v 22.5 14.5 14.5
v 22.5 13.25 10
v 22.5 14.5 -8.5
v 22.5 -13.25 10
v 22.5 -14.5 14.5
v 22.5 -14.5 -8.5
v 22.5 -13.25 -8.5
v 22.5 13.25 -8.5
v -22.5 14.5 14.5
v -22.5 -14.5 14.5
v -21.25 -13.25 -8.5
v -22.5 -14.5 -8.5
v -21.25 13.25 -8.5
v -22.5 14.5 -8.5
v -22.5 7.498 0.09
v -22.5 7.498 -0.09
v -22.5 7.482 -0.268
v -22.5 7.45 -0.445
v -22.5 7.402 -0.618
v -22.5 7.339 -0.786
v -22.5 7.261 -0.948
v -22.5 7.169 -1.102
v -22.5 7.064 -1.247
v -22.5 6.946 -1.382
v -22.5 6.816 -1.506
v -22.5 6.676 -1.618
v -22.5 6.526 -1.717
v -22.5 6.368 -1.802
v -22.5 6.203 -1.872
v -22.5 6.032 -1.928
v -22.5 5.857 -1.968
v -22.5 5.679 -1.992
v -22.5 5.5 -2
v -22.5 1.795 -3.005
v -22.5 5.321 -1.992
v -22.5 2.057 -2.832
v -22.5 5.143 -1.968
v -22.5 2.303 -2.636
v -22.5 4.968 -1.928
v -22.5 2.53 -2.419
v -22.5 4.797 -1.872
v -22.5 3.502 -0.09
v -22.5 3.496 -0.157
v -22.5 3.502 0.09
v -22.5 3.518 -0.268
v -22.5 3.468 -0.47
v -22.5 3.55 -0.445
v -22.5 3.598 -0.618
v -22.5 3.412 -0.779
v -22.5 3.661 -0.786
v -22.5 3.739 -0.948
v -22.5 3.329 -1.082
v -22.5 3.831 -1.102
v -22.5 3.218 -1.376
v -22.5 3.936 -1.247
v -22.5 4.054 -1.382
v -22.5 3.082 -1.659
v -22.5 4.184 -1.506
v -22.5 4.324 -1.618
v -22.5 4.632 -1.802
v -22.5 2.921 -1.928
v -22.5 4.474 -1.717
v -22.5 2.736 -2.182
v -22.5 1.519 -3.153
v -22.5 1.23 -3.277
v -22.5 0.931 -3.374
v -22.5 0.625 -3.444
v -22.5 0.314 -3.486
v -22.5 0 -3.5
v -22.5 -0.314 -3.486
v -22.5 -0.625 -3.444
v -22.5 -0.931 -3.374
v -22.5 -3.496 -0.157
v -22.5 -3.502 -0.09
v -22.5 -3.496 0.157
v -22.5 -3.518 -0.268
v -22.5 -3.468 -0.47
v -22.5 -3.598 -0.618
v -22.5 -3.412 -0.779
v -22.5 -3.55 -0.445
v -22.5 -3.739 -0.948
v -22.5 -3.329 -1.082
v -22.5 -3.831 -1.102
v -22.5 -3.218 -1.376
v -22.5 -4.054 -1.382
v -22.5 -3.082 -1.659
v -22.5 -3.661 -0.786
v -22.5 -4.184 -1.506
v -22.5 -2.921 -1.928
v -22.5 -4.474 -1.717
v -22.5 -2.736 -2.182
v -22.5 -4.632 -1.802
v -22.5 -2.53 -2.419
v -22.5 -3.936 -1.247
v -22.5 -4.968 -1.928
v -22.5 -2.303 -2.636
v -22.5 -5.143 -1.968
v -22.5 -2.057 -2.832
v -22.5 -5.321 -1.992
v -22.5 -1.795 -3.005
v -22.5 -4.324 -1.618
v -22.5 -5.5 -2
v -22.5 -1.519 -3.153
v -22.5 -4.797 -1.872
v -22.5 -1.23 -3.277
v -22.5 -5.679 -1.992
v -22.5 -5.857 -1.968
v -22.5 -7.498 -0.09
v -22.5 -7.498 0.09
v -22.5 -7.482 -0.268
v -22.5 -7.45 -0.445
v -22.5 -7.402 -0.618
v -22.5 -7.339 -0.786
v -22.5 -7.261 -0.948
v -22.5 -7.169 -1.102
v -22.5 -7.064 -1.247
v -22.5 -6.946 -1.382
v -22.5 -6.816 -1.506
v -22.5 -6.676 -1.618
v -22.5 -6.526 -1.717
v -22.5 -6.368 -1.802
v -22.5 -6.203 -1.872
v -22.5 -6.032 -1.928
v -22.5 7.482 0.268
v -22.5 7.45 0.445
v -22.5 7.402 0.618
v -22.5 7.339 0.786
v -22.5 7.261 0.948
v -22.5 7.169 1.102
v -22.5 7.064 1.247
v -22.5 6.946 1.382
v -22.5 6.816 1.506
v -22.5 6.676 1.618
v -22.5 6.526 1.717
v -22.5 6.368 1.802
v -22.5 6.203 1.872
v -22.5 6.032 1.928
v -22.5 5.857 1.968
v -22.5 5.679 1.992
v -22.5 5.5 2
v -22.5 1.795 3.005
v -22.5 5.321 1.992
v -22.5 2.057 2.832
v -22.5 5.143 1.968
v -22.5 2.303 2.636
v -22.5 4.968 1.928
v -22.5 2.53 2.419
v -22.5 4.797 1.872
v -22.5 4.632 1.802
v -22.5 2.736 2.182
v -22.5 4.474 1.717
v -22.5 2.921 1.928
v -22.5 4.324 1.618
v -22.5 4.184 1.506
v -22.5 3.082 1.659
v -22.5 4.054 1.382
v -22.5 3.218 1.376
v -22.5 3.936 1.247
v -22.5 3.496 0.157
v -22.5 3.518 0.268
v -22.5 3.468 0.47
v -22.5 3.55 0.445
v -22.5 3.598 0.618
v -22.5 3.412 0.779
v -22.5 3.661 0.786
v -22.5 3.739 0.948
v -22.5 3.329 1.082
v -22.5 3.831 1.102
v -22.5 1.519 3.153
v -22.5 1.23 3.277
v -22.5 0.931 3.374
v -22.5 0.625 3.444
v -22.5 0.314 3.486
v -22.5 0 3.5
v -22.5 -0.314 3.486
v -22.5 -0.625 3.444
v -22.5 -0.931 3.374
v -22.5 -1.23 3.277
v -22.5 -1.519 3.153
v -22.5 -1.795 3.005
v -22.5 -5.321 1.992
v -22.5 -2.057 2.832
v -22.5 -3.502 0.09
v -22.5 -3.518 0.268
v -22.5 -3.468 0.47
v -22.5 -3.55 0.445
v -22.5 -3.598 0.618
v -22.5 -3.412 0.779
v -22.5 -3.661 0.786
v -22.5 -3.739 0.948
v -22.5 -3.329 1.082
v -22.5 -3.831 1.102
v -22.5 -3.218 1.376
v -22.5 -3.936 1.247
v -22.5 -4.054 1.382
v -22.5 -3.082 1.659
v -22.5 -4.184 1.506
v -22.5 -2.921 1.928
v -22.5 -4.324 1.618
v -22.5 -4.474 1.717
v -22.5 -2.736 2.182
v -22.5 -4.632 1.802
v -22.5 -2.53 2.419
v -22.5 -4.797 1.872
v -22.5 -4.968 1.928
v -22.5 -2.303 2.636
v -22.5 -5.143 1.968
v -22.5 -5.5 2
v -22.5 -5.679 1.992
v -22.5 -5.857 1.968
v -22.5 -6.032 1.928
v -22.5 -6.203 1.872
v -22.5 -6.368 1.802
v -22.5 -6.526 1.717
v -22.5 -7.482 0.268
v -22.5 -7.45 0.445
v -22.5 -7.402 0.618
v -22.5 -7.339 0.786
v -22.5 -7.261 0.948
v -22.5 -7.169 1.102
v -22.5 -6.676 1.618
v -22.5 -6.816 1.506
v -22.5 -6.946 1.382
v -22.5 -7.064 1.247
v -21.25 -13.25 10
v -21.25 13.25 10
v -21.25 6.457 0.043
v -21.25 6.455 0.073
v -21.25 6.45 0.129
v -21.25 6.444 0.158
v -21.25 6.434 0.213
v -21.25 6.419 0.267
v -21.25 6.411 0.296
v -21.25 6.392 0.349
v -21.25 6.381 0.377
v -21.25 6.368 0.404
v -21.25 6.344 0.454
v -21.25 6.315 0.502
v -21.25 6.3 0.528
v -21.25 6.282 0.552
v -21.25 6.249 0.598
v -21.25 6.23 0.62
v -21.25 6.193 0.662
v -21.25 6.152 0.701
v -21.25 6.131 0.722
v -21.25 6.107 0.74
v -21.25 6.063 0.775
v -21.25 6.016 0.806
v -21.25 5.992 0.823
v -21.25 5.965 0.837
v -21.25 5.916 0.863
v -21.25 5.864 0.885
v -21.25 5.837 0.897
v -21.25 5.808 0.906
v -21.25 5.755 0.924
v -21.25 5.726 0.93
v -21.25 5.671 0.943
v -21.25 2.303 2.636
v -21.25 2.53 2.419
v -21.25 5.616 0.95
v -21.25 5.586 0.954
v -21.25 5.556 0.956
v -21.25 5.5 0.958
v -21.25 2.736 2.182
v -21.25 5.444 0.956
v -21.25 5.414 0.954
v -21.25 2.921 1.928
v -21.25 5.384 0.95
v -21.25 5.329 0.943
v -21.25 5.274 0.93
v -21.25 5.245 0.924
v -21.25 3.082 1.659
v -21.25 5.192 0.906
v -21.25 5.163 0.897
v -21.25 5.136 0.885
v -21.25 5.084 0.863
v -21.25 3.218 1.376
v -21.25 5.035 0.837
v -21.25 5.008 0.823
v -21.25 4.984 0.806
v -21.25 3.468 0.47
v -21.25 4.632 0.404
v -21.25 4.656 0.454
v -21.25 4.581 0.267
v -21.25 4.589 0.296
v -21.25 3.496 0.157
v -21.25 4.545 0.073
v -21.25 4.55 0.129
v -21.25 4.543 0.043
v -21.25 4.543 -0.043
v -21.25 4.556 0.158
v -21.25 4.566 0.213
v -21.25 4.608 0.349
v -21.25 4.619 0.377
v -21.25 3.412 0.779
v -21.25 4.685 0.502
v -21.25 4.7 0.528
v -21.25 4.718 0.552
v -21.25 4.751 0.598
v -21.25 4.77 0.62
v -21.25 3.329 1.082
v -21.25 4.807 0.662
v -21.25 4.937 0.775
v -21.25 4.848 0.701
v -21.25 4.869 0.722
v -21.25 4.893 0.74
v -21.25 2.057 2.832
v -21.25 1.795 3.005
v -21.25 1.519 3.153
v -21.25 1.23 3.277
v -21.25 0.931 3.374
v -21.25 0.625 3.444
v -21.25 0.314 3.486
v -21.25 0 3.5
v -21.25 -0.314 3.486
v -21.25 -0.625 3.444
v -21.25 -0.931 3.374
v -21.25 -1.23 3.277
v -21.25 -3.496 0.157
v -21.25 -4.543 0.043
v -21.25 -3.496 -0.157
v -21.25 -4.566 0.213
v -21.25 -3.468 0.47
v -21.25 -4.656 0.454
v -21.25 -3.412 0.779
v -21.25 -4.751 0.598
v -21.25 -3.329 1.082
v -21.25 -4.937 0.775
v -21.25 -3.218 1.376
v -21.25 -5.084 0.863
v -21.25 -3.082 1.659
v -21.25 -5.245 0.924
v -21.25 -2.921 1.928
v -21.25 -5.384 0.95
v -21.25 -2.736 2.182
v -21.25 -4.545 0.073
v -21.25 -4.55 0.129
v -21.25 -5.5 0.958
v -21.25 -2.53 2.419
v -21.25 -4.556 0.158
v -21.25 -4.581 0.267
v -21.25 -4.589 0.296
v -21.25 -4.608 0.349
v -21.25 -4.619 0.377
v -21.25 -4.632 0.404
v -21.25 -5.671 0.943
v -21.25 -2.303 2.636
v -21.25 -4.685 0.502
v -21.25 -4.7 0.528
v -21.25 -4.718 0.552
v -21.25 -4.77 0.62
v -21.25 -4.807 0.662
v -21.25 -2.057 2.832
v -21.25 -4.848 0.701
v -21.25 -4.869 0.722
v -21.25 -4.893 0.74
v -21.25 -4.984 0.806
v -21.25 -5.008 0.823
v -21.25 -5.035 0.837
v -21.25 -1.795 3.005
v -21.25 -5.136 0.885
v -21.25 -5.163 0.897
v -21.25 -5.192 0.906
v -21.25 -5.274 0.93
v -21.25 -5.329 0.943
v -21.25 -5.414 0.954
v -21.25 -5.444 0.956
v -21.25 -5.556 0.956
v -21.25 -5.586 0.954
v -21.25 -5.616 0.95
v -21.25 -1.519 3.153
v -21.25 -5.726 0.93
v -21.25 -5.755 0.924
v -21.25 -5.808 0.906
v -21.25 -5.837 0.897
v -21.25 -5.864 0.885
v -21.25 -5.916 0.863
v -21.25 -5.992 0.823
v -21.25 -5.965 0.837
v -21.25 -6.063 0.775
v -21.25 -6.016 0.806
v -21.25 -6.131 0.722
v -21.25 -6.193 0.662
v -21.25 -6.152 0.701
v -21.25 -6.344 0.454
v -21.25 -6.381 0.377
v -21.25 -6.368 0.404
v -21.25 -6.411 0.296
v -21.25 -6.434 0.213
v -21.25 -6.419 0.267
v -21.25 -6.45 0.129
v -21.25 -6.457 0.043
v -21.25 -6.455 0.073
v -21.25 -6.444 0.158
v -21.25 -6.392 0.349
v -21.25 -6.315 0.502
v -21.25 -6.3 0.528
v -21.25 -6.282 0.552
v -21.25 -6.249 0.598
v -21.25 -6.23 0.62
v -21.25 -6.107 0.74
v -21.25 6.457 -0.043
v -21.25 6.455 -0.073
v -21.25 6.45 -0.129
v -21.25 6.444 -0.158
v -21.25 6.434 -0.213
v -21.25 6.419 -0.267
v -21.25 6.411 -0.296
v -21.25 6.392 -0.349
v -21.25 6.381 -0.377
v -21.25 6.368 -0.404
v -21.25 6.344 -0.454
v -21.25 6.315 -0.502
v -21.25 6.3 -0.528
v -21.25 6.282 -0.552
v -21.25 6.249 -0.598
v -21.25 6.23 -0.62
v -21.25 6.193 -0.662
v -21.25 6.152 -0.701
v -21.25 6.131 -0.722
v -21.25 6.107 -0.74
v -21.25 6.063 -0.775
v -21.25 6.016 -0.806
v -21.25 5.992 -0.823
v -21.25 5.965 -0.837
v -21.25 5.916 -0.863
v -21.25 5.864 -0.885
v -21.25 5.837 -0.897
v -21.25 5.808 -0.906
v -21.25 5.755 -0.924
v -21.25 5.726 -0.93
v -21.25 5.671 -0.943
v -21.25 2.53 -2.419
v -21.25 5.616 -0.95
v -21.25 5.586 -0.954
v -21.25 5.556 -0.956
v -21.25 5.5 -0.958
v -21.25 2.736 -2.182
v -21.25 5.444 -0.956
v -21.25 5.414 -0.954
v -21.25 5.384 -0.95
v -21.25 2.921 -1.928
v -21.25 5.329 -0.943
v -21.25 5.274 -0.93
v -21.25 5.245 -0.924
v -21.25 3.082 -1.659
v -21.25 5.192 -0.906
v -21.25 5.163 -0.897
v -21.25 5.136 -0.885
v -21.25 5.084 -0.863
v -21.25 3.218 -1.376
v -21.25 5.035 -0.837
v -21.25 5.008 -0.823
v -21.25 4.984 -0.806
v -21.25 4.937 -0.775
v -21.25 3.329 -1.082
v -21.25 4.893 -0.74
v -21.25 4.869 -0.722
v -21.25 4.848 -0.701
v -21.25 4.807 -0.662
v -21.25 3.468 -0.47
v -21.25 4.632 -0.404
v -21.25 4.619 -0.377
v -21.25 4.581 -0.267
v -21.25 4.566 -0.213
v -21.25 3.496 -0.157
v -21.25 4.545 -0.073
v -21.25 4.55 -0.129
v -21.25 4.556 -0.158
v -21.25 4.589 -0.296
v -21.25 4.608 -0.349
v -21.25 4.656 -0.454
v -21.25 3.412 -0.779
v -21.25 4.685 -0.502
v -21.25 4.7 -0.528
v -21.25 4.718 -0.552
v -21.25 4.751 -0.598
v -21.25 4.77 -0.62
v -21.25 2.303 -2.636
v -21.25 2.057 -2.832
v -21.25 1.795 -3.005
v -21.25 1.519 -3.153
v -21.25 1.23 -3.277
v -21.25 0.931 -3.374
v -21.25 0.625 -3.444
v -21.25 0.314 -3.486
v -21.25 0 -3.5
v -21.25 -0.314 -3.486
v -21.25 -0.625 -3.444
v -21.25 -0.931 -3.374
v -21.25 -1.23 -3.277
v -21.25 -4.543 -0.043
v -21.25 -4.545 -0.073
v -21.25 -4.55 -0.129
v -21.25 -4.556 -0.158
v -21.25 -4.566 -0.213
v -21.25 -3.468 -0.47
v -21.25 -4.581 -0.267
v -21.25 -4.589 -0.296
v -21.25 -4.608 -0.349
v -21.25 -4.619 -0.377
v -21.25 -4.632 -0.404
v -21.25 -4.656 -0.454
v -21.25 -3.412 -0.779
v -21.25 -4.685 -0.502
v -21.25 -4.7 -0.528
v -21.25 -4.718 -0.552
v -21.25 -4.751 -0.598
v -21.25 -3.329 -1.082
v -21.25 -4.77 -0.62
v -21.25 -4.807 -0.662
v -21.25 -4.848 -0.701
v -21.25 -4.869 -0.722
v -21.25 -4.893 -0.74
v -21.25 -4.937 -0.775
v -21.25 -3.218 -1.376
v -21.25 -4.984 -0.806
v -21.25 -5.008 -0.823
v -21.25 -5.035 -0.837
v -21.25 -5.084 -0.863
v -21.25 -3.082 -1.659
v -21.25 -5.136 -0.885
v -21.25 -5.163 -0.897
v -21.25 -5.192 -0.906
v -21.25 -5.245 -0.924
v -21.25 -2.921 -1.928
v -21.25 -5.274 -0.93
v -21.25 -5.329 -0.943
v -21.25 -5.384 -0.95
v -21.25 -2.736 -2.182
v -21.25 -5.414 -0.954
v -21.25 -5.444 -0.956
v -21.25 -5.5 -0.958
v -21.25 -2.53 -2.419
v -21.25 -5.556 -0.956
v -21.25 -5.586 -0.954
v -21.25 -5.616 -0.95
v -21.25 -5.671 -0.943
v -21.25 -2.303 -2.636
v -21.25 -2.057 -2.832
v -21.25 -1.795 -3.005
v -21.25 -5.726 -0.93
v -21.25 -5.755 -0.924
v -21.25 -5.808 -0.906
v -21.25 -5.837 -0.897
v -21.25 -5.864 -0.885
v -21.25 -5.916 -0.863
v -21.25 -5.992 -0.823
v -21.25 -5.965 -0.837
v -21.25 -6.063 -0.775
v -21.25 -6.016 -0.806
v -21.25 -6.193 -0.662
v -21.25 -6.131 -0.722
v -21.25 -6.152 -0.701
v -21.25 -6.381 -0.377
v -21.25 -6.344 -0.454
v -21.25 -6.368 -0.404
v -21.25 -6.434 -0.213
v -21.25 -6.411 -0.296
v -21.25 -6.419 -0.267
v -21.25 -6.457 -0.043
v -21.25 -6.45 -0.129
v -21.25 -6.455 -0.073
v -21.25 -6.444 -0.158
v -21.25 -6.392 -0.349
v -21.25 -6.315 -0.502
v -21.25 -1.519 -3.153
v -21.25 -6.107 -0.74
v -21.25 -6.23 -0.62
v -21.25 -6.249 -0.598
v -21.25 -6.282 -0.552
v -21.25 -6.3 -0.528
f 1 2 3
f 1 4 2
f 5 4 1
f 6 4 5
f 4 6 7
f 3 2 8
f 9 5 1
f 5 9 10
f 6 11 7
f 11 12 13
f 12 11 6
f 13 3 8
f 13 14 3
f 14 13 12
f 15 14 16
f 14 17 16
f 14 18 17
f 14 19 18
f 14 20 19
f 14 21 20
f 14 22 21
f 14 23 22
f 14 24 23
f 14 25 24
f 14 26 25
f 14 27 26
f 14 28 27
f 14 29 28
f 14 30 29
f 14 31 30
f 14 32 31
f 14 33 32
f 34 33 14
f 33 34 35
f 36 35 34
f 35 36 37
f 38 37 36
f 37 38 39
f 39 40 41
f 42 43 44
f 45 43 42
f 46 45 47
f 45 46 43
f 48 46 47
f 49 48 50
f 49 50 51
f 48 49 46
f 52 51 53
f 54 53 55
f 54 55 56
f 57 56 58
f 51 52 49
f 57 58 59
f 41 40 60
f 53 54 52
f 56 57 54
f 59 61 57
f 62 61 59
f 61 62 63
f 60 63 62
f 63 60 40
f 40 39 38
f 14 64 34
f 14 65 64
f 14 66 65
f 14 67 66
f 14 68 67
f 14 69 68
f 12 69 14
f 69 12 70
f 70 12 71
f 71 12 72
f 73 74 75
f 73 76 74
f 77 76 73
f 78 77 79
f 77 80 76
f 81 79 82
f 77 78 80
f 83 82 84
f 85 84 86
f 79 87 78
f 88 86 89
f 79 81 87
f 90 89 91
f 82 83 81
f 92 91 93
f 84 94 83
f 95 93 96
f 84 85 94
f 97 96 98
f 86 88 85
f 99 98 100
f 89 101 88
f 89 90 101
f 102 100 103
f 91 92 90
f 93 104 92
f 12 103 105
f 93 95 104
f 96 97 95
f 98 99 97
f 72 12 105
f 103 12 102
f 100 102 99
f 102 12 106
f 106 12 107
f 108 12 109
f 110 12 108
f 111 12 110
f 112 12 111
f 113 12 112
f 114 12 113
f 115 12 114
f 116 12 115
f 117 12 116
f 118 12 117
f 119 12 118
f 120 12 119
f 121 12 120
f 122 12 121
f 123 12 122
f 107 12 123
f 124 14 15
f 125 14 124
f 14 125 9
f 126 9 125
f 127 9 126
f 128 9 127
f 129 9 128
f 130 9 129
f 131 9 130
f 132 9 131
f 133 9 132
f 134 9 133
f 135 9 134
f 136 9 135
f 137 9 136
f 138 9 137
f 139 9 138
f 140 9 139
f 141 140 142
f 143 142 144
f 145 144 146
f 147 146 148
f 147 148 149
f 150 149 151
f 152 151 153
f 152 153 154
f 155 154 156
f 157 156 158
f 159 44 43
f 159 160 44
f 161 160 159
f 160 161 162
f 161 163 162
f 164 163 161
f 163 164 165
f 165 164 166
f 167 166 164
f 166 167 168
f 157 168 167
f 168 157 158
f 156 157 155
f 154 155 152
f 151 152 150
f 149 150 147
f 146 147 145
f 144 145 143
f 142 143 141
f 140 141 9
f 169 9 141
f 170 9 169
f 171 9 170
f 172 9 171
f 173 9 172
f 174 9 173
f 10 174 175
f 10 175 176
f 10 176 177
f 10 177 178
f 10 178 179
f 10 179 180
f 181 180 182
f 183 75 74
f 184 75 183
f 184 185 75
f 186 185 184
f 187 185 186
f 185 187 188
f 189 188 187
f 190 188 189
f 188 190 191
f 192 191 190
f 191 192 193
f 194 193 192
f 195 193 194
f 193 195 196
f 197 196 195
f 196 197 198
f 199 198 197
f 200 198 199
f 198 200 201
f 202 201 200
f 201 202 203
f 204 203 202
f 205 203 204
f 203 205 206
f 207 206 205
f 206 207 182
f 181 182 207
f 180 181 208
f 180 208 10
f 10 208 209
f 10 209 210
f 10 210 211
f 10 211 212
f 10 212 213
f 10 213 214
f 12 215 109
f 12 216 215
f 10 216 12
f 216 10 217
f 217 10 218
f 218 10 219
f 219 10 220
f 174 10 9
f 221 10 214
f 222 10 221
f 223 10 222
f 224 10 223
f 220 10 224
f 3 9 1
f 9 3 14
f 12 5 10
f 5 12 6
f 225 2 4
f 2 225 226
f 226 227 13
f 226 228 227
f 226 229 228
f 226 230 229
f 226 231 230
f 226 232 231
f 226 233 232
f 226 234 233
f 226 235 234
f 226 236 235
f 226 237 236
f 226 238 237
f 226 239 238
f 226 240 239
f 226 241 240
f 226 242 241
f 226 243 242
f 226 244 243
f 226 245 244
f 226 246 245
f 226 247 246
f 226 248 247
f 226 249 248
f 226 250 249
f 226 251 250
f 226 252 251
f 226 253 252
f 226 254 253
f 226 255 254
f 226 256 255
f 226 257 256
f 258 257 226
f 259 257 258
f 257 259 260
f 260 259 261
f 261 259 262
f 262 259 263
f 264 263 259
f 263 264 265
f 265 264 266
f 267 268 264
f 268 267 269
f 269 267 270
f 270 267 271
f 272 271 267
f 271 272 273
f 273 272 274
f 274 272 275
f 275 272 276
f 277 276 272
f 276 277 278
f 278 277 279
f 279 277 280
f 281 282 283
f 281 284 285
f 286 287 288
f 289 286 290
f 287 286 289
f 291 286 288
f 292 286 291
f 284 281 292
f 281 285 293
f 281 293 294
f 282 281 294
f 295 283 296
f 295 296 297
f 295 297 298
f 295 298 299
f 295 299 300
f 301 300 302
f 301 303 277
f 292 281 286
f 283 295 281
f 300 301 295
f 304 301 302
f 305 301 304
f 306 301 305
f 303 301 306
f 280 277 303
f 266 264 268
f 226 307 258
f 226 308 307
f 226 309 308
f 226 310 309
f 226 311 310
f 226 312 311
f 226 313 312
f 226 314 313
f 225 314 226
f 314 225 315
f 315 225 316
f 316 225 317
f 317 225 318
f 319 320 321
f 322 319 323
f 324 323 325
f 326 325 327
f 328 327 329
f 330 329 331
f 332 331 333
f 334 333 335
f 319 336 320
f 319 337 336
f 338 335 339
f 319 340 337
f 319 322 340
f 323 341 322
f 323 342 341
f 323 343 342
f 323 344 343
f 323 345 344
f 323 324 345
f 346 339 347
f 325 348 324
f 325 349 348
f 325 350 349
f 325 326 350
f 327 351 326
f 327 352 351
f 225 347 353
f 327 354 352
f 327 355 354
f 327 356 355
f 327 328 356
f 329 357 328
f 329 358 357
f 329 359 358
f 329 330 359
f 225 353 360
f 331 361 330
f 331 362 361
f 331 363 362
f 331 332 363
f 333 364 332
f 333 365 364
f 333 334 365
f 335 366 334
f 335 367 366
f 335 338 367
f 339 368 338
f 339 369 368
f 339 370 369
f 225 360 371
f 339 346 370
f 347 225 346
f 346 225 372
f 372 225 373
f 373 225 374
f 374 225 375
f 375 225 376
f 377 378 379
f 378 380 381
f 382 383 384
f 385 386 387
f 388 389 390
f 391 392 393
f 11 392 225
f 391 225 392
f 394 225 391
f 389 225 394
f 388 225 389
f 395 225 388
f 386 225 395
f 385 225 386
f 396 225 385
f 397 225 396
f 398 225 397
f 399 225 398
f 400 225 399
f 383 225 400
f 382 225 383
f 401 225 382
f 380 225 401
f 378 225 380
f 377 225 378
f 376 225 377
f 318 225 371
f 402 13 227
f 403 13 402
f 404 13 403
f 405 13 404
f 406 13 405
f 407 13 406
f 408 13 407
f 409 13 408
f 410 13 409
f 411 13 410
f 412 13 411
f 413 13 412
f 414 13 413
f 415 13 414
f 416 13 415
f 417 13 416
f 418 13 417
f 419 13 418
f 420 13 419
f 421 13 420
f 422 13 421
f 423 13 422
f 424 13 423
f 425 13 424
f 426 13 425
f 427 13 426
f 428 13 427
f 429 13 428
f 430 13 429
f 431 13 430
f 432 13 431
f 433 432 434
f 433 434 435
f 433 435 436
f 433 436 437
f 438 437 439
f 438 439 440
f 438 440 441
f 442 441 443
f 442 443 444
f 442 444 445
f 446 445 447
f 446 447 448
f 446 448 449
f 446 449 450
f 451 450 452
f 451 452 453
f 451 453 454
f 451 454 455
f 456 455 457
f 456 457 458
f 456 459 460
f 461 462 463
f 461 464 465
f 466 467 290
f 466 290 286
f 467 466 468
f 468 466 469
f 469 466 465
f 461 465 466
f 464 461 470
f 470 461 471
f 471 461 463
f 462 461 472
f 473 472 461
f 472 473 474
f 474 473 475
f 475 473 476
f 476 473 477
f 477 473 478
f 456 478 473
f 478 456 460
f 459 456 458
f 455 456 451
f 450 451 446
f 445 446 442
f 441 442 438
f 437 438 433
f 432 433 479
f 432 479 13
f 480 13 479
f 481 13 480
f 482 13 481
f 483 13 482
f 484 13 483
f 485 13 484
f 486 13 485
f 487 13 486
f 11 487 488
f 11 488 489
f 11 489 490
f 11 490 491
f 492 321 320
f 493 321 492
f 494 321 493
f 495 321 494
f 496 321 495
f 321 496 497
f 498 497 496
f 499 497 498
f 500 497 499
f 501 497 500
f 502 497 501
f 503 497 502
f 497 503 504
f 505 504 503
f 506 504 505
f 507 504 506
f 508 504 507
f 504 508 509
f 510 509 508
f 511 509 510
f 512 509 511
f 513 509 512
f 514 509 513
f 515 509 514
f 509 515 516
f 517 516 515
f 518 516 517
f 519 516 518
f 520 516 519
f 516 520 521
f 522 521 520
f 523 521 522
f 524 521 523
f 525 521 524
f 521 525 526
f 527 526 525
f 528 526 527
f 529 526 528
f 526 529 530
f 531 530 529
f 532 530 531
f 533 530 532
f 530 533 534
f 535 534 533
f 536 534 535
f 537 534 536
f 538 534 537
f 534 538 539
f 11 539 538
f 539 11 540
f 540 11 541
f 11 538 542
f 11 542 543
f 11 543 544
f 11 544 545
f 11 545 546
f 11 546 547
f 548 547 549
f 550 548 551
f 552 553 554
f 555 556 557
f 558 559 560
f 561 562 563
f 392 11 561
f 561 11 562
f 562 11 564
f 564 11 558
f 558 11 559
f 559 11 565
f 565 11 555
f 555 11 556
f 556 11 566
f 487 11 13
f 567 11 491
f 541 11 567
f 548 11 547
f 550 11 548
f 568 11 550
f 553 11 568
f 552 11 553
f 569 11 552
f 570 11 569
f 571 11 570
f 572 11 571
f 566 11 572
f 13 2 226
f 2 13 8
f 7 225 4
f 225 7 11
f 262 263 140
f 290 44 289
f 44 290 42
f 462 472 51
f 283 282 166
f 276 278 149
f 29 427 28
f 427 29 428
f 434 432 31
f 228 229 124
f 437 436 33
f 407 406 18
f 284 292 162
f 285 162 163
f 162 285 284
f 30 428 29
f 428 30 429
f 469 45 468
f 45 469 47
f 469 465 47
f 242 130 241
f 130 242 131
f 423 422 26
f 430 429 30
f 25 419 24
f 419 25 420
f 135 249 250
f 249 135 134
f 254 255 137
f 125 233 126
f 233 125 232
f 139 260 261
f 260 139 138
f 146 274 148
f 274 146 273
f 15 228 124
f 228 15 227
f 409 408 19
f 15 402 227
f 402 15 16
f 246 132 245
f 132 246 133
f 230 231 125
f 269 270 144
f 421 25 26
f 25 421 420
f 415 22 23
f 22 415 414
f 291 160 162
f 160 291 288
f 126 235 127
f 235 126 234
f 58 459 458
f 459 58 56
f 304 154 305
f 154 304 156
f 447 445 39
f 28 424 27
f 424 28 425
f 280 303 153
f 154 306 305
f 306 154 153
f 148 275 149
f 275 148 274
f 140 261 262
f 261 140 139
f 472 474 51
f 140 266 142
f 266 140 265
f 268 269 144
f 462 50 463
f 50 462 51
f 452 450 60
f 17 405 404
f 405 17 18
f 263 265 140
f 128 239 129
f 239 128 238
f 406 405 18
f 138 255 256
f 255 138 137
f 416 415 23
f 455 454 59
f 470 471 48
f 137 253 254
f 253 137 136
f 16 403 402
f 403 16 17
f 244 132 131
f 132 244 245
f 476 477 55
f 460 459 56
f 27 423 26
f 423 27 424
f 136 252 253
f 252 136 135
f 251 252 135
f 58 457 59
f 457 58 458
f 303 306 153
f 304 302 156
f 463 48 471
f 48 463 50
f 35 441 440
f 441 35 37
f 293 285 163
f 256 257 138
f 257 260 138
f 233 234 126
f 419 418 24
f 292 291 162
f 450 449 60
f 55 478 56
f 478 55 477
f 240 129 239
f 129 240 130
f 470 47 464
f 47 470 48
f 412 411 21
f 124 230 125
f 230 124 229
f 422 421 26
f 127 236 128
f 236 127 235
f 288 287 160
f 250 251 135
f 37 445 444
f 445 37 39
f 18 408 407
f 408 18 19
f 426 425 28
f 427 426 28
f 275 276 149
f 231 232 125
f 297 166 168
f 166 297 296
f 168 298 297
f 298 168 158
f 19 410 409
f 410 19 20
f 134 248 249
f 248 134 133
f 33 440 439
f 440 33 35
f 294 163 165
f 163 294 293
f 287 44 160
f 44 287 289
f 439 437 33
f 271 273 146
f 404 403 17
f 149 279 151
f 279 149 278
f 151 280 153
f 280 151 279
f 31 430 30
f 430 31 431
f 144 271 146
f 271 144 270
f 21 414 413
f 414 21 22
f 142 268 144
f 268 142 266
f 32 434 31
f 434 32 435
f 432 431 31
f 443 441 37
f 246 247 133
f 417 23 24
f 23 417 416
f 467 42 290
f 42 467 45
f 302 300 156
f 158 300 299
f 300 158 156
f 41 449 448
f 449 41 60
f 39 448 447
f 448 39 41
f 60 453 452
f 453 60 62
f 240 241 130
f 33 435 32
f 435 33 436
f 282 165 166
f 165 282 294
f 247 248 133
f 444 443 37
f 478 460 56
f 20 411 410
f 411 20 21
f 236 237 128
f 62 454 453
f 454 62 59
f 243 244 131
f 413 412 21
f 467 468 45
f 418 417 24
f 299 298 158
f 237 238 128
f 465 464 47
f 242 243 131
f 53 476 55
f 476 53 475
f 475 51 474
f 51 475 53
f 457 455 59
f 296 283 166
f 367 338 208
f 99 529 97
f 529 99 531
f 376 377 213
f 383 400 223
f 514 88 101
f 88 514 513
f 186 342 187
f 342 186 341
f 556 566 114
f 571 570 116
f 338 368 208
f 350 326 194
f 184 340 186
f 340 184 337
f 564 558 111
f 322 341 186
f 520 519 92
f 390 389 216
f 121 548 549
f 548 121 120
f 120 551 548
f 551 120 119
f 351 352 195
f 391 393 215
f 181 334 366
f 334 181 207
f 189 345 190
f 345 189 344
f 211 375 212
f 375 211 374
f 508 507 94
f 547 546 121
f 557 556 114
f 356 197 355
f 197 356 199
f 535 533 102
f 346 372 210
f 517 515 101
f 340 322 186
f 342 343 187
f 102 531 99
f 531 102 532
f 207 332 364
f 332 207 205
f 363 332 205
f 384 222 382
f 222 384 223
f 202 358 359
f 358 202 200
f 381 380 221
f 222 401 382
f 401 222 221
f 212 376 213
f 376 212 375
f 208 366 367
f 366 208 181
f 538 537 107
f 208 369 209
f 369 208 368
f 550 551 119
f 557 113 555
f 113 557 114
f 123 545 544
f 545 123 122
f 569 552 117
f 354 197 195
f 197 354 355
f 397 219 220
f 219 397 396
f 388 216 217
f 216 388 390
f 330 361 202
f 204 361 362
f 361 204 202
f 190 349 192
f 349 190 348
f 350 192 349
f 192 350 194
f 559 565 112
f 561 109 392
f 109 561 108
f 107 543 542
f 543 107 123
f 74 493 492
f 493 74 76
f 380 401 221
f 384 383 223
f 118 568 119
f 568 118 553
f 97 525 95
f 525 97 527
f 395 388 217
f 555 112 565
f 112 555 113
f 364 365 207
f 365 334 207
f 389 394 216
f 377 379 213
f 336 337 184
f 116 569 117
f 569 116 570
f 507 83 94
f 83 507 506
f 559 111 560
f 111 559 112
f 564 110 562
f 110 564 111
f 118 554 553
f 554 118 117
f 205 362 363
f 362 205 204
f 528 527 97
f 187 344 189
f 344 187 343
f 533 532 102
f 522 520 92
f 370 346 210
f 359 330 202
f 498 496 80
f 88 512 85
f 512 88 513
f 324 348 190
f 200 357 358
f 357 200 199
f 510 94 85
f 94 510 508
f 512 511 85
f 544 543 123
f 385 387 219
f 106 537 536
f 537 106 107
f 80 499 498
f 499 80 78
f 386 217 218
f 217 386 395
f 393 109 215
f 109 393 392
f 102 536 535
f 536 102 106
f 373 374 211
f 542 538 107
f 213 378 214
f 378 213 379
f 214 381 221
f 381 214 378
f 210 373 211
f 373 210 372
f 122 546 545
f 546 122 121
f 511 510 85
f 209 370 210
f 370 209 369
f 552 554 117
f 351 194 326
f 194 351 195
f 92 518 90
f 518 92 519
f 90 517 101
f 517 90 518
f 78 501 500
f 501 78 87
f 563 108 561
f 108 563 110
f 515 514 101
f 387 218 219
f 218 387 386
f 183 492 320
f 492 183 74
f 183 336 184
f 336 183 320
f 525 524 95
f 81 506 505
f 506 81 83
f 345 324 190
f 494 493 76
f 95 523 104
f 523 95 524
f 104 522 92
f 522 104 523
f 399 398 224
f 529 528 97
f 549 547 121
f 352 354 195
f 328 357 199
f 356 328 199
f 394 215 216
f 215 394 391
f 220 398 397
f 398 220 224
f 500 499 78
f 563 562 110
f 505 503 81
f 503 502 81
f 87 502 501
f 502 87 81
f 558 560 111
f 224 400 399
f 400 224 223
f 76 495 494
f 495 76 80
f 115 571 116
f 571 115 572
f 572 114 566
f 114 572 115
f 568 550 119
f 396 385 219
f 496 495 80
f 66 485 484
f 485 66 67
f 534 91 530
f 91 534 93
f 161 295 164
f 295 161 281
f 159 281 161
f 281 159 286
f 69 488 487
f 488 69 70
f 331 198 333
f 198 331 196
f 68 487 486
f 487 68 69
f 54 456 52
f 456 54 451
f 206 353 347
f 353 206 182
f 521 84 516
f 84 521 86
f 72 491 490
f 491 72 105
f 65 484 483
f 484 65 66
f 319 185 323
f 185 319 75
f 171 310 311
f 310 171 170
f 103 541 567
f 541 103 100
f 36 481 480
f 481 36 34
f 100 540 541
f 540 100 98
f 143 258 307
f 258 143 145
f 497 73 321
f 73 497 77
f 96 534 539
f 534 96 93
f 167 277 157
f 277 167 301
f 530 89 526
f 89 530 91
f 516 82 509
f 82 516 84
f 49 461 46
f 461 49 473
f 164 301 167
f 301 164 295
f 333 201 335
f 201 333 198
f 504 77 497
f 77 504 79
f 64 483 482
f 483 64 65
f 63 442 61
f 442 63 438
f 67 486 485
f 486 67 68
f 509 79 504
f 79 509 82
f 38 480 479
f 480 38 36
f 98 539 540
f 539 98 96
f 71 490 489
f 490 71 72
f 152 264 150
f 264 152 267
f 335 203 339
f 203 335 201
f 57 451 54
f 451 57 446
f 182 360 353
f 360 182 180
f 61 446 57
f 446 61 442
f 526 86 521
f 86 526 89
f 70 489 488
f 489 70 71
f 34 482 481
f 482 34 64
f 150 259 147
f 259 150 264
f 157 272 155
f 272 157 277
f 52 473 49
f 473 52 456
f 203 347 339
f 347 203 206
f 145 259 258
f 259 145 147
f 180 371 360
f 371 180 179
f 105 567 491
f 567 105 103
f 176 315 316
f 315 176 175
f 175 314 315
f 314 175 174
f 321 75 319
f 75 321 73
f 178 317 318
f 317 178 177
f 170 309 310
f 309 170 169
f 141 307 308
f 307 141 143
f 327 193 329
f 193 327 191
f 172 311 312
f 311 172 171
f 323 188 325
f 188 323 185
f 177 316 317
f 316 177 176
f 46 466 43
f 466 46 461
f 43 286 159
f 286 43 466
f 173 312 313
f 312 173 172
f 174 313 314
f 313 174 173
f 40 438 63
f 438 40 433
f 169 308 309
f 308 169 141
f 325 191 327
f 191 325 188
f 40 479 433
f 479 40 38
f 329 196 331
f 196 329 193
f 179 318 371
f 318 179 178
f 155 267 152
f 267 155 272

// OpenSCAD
precision      = 70;

radial_gap     = 0.25;
cube_gap       = 0.5;

wall_thickness = 4;
/*************************************************************************************************/
/*************************************************************************************************/
/************************************* <NEW BASE MODULES/> ***************************************/
module cube_peg(length, width, height)
{
    cube(size = [length, width, height], center = true);
}
/*************************************************************************************************/
module radial_peg(radius, height)
{
    cylinder(r = radius, h = height, $fn = precision, center = true);
}
/*************************************************************************************************/
module cube_hole(length, width, height, wall)
{
    difference()
    {
        cube_peg(length + cube_gap + wall, width + cube_gap + wall, height);
        cube_peg(length + cube_gap, width + cube_gap, height);
    }
}
/*************************************************************************************************/
module radial_hole(radius, height, wall)
{
    wall = wall/2;
    difference()
    {
        radial_peg(radius + radial_gap + wall, height);
        radial_peg(radius + radial_gap, height);
    }
}
/*************************************************************************************************/
module cube_lip(length_outer, length_inner, width_outer, width_inner, height)
{
    difference()
    {
        cube(size = [length_outer, width_outer, height], center = true);
        cube(size = [length_inner, width_inner, height], center = true);
    }
}
/*************************************************************************************************/
module cube_lid(length_outer, length_inner, width_outer, width_inner, height)
{
    wall_size = 2;
    difference()
    {
        cube(size = [length_outer + wall_size, width_outer + wall_size, height], center = true);
        cube_lip(length_outer + cube_gap, length_inner - cube_gap, width_outer + cube_gap, width_inner - cube_gap, height);
    }
    translate([0, 0, -height])
    cube(size = [length_outer + wall_size, width_outer + wall_size, height], center = true);
}
/*************************************************************************************************/
module cube_cap(length_outer, width_outer, height, wall)
{
    difference()
    {
        cube_peg(length_outer + wall, width_outer + wall, height + wall);
        translate([0, 0, -wall])
        cube_peg(length_outer + cube_gap, width_outer + cube_gap, height);
    }
}
/*************************************************************************************************/
module radial_lip(radius_outer, radius_inner, height)
{
    difference()
    {
        cylinder(r = radius_outer, h = height, $fn = precision, center = true);
        cylinder(r = radius_inner, h = height, $fn = precision, center = true);
    }
}
/*************************************************************************************************/
module radial_lid(radius_lip_outer, radius_lip_inner, height)
{
    wall_radius = 2;// This is how much material is on the outside of the cap: it has nothing to do with fit.
    difference()
    {
      cylinder(r = radius_lip_outer + wall_radius, h = height, $fn = precision, center = true);
      radial_lip(radius_lip_outer + radial_gap, radius_lip_inner - radial_gap, height);
    }
    translate([0, 0, -height])
    cylinder(r = radius_lip_outer + wall_radius, h = height, $fn = precision, center = true);
}
/*************************************************************************************************/
module radial_cap(radius_peg, height, wall)
{
    difference()
    {
        cylinder(r = radius_peg + wall, h = height + wall, $fn = precision, center = true);
        translate([0, 0, wall/2])
        radial_peg(radius_peg + radial_gap, height);
    }
}
/************************************* </NEW BASE MODULES> *****************************************/
/*********************************** <NEW COMPOSITE MODULES/> **************************************/
/***************************************************************************************************/

botball_radius = 179/2;
camera_clearance = 15;
castor_offset_angle = 0;
castor_offset_radius = botball_radius - 13;
mount_offset_angle = 45;
mount_offset_radius = 70;
cutout_width = 60;
cutout_length = (botball_radius + camera_clearance) * 2;

deck_height = 5;
deck_spacing = 60;
link_footprint = 120/2;

bumper_height = 25;
bumper_thickness = 6;
bumper_top_height = 15;
bumper_bottom_height = deck_height * 2;
hole_radius = 2.5;

wheel_radius = 30;
wheel_width = 10;
wheel_allowance = 5;

motor_width = 26;
motor_length = 42;
motor_height = 20;
motor_mount_thickness = 3;

motor_shaft_radius = 7/2;
motor_mount_orad   = 4/2;
motor_mount_irad   = 3/4;

unit_height = (bumper_top_height + bumper_bottom_height) * 2 + camera_clearance * 2;

/***************************************************************************************/
//rotate([0, -90, 0])
module motor_mount()
{

    difference(){
        //big cube
        translate([0, 0, motor_mount_thickness])
        cube_cap(motor_length, motor_width, motor_height, motor_mount_thickness);
        //hole for the motor
        translate([(motor_length + motor_mount_thickness/2) /2, 0, 0])
        cube_peg(motor_mount_thickness/2, motor_width + motor_mount_thickness/6, motor_height);
        //this is just a test for the next two lines
        //translate([motor_mount_thickness/2, 0, motor_mount_thickness])
        //cube_peg(motor_length, motor_width + motor_mount_thickness, motor_height + motor_mount_thickness);
        
        //right hole
        translate([-(motor_length + motor_mount_thickness/2) /2, 5.5, 0])
        
        rotate([0, -90, 0])
        cylinder(r1 = motor_mount_irad, r2 = motor_mount_orad, h = motor_mount_thickness/2, $fn = precision, center = true);
        //left hole
        translate([-(motor_length + motor_mount_thickness/2) /2, -5.5, 0])
        rotate([0, -90, 0])
        cylinder(r1 = motor_mount_irad, r2 = motor_mount_orad, h = motor_mount_thickness/2, $fn = precision, center = true);
        //center hole
        translate([-(motor_length + motor_mount_thickness/2) /2, 0.0, 0])
        rotate([0, 90, 0])
        cylinder(r = motor_shaft_radius, h = motor_mount_thickness/2, $fn = precision, center = true);
    }
   
}
motor_mount();
